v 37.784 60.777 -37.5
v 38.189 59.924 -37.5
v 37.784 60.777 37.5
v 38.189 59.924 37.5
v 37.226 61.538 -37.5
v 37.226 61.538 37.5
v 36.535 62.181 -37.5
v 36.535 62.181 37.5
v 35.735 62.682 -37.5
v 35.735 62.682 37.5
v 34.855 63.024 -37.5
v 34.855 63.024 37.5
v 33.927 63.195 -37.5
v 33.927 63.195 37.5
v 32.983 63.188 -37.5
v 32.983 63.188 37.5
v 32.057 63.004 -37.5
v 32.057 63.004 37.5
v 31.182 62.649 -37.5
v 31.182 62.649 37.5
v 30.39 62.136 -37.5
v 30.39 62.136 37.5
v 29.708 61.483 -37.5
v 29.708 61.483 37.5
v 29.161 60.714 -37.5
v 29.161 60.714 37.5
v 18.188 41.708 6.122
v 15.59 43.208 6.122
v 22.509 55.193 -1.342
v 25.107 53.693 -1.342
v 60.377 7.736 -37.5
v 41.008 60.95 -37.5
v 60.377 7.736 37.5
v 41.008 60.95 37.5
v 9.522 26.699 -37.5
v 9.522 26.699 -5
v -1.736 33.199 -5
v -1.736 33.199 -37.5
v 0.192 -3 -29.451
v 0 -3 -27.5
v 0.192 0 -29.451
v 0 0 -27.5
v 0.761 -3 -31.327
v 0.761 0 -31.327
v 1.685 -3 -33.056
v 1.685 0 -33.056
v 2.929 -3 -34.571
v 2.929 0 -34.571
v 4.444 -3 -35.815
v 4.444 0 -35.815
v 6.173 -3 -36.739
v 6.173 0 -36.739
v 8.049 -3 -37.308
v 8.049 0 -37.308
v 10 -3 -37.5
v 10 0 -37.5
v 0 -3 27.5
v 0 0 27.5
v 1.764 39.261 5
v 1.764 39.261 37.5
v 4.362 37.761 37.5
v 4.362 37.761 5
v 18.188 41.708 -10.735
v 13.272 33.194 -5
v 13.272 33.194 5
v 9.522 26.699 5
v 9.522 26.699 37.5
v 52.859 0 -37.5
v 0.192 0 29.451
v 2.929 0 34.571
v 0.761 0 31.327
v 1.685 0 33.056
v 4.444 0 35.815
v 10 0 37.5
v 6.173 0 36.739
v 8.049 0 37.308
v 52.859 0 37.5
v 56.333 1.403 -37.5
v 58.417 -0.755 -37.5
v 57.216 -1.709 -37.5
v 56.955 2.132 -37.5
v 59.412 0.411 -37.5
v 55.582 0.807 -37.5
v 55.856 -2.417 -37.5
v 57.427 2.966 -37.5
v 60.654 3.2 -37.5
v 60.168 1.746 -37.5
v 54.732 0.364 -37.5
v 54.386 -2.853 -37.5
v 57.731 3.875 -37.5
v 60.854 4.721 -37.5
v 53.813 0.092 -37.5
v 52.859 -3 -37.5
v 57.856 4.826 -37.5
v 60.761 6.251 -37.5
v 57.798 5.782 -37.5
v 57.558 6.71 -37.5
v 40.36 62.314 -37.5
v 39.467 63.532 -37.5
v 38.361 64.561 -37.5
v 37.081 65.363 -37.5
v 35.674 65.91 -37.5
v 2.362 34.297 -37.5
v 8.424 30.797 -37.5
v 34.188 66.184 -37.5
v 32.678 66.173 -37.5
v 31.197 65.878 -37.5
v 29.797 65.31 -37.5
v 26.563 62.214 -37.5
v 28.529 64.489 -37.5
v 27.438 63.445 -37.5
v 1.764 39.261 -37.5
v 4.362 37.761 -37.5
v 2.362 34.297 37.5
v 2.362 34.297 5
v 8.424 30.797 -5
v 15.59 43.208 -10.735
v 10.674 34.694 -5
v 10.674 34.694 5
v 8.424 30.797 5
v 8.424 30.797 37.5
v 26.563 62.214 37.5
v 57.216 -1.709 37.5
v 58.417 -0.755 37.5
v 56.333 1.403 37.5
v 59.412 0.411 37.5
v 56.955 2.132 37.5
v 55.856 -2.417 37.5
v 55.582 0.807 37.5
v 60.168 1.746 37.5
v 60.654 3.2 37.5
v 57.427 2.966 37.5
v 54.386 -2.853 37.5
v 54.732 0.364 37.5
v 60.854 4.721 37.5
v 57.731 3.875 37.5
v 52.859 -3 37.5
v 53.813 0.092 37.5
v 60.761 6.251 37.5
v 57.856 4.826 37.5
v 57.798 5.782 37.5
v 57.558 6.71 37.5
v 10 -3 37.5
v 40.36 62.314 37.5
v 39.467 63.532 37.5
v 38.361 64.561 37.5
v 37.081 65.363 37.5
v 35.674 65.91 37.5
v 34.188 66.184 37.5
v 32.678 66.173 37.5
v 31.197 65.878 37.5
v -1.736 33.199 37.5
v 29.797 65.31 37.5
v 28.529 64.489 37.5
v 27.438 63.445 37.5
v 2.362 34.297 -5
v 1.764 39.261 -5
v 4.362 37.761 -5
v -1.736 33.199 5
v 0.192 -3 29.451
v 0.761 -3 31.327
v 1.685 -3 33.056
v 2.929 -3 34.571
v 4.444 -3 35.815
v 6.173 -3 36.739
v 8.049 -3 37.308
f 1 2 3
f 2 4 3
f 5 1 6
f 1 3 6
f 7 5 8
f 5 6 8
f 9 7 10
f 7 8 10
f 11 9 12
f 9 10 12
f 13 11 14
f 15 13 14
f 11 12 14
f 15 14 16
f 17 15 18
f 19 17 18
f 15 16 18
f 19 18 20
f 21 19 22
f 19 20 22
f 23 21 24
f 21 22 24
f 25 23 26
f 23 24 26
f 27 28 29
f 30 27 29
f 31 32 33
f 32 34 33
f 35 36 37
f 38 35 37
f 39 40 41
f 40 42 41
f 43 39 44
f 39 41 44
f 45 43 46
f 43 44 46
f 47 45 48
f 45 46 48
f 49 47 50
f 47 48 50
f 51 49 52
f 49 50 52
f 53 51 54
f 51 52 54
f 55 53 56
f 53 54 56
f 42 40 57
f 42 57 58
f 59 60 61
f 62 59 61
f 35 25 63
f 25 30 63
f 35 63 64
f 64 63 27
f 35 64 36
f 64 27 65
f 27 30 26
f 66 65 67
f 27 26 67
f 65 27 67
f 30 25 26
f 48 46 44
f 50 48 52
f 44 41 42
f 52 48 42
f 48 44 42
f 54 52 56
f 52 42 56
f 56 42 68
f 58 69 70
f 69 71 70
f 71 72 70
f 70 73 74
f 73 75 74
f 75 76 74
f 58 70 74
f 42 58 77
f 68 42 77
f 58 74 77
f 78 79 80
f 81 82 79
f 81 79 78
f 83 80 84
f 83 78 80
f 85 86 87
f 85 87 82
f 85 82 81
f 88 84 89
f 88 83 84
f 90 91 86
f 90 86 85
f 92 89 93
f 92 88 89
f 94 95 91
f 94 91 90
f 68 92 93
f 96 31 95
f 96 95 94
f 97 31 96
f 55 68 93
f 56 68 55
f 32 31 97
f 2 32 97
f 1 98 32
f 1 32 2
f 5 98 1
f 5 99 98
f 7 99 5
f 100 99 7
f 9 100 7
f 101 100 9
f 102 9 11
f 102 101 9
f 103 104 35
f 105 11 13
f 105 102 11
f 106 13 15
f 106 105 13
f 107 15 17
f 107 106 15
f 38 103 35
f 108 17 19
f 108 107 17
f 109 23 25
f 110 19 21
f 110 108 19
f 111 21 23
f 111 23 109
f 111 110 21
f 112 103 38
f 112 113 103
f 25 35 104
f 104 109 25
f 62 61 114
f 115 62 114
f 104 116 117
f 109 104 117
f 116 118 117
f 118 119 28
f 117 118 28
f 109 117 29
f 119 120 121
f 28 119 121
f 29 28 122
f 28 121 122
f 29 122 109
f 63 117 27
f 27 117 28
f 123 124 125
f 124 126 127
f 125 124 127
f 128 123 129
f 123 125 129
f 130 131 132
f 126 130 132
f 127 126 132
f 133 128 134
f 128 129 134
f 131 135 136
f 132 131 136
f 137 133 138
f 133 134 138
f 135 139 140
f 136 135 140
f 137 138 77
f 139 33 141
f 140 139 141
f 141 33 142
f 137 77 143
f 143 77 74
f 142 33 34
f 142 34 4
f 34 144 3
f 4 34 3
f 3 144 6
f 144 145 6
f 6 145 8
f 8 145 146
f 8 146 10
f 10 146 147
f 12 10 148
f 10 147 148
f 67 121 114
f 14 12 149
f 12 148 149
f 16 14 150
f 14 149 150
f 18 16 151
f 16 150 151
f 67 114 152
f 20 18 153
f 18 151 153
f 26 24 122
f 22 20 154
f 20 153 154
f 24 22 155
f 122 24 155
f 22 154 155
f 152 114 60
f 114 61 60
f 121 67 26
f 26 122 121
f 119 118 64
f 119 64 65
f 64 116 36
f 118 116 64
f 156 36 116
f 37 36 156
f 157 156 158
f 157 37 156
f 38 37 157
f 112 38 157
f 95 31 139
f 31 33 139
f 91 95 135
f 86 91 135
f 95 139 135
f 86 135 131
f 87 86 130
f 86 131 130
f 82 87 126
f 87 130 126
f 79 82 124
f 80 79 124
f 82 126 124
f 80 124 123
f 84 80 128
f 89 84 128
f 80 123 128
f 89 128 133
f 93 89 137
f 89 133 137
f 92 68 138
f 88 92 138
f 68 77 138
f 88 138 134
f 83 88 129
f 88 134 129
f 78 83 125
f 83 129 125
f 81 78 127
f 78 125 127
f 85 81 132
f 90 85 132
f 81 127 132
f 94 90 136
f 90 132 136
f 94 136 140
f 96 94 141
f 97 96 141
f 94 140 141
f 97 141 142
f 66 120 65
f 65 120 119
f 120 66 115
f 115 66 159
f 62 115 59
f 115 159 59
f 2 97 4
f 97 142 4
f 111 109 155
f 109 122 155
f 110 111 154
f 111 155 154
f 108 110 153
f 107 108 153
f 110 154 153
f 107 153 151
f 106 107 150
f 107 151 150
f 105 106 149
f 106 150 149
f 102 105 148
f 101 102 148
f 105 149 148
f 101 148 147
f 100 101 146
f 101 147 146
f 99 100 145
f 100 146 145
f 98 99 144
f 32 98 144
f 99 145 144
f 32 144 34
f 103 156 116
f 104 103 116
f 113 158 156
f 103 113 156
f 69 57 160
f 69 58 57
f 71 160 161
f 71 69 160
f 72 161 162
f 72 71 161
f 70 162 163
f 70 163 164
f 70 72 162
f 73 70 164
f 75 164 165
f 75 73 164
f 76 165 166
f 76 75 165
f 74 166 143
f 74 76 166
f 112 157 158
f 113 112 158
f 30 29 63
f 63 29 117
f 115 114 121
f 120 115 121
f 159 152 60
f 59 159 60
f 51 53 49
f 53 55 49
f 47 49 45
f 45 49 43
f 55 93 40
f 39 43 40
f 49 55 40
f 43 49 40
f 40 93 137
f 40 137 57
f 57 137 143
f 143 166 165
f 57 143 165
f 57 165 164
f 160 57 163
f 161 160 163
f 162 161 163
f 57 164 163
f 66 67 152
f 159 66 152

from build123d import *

# Parameters (mm, degrees)
EXTRUDE_2_DEPTH     = 37.5
SKETCH_2_W          = 10
SKETCH_2_H          = 15
CUT_EXTRUDE_2_DEPTH = 20
FILLET_1_R          = 10
FILLET_2_R          = 10
CUT_EXTRUDE_3_DEPTH = 15


with BuildPart() as part:
    # 草图1 → 凸台-拉伸2 (new body, symmetric)
    with BuildSketch(Plane.XY):
        with BuildLine():
            Line((0, 0), (52.859259966, 0))
            ThreePointArc((52.859259966, 0), (56.955020188, 2.132117818), (57.55772307, 6.710100717))
            Line((57.55772307, 6.710100717), (38.189406423, 59.924113358))
            ThreePointArc((38.189406423, 59.924113358), (33.926722033, 63.194986132), (29.1608163, 60.714012641))
            Line((29.1608163, 60.714012641), (9.522083601, 26.698729811))
            Line((9.522083601, 26.698729811), (-1.736246648, 33.198729811))
            Line((-1.736246648, 33.198729811), (1.763753352, 39.260907637))
            Line((1.763753352, 39.260907637), (4.361829564, 37.760907637))
            Line((4.361829564, 37.760907637), (2.361829564, 34.296806022))
            Line((2.361829564, 34.296806022), (8.42400739, 30.796806022))
            Line((8.42400739, 30.796806022), (26.562740089, 62.214012641))
            ThreePointArc((26.562740089, 62.214012641), (34.188189261, 66.183570226), (41.008484285, 60.950173788))
            Line((41.008484285, 60.950173788), (60.376800933, 7.736161147))
            ThreePointArc((60.376800933, 7.736161147), (59.412476321, 0.411388509), (52.859259966, -3))
            Line((52.859259966, -3), (0, -3))
            Line((0, -3), (0, 0))
        make_face()
    extrude(amount=EXTRUDE_2_DEPTH, both=True)

    # 草图2 → 切除-拉伸2 (cut)
    with BuildSketch(Plane(origin=(-15.677656681, 9.051499305, 0), x_dir=(0, 0, 1), z_dir=(-0.866025404, 0.5, 0))):
        with Locations((0, 27.882820066)):
            Rectangle(SKETCH_2_W, SKETCH_2_H)
    extrude(amount=-CUT_EXTRUDE_2_DEPTH, mode=Mode.SUBTRACT)

    # 圆角1
    fillet_1_edges = [part.edges().sort_by_distance(p)[0] for p in [
        (0, -1.5, -37.5),
    ]]
    fillet(fillet_1_edges, radius=FILLET_1_R)

    # 圆角2
    fillet_2_edges = [part.edges().sort_by_distance(p)[0] for p in [
        (0, -1.5, 37.5),
    ]]
    fillet(fillet_2_edges, radius=FILLET_2_R)

    # 草图3 → 切除-拉伸3 (cut)
    with BuildSketch(Plane(origin=(-7.017402643, 4.051499305, 0), x_dir=(0, 0, 1), z_dir=(-0.866025404, 0.5, 0))):
        Polygon((-1.341883091, 59.052563915), (-10.735064726, 45.214394542), (6.122341602, 45.214394542), align=None)
    extrude(amount=-CUT_EXTRUDE_3_DEPTH, mode=Mode.SUBTRACT)


solid = part.part
